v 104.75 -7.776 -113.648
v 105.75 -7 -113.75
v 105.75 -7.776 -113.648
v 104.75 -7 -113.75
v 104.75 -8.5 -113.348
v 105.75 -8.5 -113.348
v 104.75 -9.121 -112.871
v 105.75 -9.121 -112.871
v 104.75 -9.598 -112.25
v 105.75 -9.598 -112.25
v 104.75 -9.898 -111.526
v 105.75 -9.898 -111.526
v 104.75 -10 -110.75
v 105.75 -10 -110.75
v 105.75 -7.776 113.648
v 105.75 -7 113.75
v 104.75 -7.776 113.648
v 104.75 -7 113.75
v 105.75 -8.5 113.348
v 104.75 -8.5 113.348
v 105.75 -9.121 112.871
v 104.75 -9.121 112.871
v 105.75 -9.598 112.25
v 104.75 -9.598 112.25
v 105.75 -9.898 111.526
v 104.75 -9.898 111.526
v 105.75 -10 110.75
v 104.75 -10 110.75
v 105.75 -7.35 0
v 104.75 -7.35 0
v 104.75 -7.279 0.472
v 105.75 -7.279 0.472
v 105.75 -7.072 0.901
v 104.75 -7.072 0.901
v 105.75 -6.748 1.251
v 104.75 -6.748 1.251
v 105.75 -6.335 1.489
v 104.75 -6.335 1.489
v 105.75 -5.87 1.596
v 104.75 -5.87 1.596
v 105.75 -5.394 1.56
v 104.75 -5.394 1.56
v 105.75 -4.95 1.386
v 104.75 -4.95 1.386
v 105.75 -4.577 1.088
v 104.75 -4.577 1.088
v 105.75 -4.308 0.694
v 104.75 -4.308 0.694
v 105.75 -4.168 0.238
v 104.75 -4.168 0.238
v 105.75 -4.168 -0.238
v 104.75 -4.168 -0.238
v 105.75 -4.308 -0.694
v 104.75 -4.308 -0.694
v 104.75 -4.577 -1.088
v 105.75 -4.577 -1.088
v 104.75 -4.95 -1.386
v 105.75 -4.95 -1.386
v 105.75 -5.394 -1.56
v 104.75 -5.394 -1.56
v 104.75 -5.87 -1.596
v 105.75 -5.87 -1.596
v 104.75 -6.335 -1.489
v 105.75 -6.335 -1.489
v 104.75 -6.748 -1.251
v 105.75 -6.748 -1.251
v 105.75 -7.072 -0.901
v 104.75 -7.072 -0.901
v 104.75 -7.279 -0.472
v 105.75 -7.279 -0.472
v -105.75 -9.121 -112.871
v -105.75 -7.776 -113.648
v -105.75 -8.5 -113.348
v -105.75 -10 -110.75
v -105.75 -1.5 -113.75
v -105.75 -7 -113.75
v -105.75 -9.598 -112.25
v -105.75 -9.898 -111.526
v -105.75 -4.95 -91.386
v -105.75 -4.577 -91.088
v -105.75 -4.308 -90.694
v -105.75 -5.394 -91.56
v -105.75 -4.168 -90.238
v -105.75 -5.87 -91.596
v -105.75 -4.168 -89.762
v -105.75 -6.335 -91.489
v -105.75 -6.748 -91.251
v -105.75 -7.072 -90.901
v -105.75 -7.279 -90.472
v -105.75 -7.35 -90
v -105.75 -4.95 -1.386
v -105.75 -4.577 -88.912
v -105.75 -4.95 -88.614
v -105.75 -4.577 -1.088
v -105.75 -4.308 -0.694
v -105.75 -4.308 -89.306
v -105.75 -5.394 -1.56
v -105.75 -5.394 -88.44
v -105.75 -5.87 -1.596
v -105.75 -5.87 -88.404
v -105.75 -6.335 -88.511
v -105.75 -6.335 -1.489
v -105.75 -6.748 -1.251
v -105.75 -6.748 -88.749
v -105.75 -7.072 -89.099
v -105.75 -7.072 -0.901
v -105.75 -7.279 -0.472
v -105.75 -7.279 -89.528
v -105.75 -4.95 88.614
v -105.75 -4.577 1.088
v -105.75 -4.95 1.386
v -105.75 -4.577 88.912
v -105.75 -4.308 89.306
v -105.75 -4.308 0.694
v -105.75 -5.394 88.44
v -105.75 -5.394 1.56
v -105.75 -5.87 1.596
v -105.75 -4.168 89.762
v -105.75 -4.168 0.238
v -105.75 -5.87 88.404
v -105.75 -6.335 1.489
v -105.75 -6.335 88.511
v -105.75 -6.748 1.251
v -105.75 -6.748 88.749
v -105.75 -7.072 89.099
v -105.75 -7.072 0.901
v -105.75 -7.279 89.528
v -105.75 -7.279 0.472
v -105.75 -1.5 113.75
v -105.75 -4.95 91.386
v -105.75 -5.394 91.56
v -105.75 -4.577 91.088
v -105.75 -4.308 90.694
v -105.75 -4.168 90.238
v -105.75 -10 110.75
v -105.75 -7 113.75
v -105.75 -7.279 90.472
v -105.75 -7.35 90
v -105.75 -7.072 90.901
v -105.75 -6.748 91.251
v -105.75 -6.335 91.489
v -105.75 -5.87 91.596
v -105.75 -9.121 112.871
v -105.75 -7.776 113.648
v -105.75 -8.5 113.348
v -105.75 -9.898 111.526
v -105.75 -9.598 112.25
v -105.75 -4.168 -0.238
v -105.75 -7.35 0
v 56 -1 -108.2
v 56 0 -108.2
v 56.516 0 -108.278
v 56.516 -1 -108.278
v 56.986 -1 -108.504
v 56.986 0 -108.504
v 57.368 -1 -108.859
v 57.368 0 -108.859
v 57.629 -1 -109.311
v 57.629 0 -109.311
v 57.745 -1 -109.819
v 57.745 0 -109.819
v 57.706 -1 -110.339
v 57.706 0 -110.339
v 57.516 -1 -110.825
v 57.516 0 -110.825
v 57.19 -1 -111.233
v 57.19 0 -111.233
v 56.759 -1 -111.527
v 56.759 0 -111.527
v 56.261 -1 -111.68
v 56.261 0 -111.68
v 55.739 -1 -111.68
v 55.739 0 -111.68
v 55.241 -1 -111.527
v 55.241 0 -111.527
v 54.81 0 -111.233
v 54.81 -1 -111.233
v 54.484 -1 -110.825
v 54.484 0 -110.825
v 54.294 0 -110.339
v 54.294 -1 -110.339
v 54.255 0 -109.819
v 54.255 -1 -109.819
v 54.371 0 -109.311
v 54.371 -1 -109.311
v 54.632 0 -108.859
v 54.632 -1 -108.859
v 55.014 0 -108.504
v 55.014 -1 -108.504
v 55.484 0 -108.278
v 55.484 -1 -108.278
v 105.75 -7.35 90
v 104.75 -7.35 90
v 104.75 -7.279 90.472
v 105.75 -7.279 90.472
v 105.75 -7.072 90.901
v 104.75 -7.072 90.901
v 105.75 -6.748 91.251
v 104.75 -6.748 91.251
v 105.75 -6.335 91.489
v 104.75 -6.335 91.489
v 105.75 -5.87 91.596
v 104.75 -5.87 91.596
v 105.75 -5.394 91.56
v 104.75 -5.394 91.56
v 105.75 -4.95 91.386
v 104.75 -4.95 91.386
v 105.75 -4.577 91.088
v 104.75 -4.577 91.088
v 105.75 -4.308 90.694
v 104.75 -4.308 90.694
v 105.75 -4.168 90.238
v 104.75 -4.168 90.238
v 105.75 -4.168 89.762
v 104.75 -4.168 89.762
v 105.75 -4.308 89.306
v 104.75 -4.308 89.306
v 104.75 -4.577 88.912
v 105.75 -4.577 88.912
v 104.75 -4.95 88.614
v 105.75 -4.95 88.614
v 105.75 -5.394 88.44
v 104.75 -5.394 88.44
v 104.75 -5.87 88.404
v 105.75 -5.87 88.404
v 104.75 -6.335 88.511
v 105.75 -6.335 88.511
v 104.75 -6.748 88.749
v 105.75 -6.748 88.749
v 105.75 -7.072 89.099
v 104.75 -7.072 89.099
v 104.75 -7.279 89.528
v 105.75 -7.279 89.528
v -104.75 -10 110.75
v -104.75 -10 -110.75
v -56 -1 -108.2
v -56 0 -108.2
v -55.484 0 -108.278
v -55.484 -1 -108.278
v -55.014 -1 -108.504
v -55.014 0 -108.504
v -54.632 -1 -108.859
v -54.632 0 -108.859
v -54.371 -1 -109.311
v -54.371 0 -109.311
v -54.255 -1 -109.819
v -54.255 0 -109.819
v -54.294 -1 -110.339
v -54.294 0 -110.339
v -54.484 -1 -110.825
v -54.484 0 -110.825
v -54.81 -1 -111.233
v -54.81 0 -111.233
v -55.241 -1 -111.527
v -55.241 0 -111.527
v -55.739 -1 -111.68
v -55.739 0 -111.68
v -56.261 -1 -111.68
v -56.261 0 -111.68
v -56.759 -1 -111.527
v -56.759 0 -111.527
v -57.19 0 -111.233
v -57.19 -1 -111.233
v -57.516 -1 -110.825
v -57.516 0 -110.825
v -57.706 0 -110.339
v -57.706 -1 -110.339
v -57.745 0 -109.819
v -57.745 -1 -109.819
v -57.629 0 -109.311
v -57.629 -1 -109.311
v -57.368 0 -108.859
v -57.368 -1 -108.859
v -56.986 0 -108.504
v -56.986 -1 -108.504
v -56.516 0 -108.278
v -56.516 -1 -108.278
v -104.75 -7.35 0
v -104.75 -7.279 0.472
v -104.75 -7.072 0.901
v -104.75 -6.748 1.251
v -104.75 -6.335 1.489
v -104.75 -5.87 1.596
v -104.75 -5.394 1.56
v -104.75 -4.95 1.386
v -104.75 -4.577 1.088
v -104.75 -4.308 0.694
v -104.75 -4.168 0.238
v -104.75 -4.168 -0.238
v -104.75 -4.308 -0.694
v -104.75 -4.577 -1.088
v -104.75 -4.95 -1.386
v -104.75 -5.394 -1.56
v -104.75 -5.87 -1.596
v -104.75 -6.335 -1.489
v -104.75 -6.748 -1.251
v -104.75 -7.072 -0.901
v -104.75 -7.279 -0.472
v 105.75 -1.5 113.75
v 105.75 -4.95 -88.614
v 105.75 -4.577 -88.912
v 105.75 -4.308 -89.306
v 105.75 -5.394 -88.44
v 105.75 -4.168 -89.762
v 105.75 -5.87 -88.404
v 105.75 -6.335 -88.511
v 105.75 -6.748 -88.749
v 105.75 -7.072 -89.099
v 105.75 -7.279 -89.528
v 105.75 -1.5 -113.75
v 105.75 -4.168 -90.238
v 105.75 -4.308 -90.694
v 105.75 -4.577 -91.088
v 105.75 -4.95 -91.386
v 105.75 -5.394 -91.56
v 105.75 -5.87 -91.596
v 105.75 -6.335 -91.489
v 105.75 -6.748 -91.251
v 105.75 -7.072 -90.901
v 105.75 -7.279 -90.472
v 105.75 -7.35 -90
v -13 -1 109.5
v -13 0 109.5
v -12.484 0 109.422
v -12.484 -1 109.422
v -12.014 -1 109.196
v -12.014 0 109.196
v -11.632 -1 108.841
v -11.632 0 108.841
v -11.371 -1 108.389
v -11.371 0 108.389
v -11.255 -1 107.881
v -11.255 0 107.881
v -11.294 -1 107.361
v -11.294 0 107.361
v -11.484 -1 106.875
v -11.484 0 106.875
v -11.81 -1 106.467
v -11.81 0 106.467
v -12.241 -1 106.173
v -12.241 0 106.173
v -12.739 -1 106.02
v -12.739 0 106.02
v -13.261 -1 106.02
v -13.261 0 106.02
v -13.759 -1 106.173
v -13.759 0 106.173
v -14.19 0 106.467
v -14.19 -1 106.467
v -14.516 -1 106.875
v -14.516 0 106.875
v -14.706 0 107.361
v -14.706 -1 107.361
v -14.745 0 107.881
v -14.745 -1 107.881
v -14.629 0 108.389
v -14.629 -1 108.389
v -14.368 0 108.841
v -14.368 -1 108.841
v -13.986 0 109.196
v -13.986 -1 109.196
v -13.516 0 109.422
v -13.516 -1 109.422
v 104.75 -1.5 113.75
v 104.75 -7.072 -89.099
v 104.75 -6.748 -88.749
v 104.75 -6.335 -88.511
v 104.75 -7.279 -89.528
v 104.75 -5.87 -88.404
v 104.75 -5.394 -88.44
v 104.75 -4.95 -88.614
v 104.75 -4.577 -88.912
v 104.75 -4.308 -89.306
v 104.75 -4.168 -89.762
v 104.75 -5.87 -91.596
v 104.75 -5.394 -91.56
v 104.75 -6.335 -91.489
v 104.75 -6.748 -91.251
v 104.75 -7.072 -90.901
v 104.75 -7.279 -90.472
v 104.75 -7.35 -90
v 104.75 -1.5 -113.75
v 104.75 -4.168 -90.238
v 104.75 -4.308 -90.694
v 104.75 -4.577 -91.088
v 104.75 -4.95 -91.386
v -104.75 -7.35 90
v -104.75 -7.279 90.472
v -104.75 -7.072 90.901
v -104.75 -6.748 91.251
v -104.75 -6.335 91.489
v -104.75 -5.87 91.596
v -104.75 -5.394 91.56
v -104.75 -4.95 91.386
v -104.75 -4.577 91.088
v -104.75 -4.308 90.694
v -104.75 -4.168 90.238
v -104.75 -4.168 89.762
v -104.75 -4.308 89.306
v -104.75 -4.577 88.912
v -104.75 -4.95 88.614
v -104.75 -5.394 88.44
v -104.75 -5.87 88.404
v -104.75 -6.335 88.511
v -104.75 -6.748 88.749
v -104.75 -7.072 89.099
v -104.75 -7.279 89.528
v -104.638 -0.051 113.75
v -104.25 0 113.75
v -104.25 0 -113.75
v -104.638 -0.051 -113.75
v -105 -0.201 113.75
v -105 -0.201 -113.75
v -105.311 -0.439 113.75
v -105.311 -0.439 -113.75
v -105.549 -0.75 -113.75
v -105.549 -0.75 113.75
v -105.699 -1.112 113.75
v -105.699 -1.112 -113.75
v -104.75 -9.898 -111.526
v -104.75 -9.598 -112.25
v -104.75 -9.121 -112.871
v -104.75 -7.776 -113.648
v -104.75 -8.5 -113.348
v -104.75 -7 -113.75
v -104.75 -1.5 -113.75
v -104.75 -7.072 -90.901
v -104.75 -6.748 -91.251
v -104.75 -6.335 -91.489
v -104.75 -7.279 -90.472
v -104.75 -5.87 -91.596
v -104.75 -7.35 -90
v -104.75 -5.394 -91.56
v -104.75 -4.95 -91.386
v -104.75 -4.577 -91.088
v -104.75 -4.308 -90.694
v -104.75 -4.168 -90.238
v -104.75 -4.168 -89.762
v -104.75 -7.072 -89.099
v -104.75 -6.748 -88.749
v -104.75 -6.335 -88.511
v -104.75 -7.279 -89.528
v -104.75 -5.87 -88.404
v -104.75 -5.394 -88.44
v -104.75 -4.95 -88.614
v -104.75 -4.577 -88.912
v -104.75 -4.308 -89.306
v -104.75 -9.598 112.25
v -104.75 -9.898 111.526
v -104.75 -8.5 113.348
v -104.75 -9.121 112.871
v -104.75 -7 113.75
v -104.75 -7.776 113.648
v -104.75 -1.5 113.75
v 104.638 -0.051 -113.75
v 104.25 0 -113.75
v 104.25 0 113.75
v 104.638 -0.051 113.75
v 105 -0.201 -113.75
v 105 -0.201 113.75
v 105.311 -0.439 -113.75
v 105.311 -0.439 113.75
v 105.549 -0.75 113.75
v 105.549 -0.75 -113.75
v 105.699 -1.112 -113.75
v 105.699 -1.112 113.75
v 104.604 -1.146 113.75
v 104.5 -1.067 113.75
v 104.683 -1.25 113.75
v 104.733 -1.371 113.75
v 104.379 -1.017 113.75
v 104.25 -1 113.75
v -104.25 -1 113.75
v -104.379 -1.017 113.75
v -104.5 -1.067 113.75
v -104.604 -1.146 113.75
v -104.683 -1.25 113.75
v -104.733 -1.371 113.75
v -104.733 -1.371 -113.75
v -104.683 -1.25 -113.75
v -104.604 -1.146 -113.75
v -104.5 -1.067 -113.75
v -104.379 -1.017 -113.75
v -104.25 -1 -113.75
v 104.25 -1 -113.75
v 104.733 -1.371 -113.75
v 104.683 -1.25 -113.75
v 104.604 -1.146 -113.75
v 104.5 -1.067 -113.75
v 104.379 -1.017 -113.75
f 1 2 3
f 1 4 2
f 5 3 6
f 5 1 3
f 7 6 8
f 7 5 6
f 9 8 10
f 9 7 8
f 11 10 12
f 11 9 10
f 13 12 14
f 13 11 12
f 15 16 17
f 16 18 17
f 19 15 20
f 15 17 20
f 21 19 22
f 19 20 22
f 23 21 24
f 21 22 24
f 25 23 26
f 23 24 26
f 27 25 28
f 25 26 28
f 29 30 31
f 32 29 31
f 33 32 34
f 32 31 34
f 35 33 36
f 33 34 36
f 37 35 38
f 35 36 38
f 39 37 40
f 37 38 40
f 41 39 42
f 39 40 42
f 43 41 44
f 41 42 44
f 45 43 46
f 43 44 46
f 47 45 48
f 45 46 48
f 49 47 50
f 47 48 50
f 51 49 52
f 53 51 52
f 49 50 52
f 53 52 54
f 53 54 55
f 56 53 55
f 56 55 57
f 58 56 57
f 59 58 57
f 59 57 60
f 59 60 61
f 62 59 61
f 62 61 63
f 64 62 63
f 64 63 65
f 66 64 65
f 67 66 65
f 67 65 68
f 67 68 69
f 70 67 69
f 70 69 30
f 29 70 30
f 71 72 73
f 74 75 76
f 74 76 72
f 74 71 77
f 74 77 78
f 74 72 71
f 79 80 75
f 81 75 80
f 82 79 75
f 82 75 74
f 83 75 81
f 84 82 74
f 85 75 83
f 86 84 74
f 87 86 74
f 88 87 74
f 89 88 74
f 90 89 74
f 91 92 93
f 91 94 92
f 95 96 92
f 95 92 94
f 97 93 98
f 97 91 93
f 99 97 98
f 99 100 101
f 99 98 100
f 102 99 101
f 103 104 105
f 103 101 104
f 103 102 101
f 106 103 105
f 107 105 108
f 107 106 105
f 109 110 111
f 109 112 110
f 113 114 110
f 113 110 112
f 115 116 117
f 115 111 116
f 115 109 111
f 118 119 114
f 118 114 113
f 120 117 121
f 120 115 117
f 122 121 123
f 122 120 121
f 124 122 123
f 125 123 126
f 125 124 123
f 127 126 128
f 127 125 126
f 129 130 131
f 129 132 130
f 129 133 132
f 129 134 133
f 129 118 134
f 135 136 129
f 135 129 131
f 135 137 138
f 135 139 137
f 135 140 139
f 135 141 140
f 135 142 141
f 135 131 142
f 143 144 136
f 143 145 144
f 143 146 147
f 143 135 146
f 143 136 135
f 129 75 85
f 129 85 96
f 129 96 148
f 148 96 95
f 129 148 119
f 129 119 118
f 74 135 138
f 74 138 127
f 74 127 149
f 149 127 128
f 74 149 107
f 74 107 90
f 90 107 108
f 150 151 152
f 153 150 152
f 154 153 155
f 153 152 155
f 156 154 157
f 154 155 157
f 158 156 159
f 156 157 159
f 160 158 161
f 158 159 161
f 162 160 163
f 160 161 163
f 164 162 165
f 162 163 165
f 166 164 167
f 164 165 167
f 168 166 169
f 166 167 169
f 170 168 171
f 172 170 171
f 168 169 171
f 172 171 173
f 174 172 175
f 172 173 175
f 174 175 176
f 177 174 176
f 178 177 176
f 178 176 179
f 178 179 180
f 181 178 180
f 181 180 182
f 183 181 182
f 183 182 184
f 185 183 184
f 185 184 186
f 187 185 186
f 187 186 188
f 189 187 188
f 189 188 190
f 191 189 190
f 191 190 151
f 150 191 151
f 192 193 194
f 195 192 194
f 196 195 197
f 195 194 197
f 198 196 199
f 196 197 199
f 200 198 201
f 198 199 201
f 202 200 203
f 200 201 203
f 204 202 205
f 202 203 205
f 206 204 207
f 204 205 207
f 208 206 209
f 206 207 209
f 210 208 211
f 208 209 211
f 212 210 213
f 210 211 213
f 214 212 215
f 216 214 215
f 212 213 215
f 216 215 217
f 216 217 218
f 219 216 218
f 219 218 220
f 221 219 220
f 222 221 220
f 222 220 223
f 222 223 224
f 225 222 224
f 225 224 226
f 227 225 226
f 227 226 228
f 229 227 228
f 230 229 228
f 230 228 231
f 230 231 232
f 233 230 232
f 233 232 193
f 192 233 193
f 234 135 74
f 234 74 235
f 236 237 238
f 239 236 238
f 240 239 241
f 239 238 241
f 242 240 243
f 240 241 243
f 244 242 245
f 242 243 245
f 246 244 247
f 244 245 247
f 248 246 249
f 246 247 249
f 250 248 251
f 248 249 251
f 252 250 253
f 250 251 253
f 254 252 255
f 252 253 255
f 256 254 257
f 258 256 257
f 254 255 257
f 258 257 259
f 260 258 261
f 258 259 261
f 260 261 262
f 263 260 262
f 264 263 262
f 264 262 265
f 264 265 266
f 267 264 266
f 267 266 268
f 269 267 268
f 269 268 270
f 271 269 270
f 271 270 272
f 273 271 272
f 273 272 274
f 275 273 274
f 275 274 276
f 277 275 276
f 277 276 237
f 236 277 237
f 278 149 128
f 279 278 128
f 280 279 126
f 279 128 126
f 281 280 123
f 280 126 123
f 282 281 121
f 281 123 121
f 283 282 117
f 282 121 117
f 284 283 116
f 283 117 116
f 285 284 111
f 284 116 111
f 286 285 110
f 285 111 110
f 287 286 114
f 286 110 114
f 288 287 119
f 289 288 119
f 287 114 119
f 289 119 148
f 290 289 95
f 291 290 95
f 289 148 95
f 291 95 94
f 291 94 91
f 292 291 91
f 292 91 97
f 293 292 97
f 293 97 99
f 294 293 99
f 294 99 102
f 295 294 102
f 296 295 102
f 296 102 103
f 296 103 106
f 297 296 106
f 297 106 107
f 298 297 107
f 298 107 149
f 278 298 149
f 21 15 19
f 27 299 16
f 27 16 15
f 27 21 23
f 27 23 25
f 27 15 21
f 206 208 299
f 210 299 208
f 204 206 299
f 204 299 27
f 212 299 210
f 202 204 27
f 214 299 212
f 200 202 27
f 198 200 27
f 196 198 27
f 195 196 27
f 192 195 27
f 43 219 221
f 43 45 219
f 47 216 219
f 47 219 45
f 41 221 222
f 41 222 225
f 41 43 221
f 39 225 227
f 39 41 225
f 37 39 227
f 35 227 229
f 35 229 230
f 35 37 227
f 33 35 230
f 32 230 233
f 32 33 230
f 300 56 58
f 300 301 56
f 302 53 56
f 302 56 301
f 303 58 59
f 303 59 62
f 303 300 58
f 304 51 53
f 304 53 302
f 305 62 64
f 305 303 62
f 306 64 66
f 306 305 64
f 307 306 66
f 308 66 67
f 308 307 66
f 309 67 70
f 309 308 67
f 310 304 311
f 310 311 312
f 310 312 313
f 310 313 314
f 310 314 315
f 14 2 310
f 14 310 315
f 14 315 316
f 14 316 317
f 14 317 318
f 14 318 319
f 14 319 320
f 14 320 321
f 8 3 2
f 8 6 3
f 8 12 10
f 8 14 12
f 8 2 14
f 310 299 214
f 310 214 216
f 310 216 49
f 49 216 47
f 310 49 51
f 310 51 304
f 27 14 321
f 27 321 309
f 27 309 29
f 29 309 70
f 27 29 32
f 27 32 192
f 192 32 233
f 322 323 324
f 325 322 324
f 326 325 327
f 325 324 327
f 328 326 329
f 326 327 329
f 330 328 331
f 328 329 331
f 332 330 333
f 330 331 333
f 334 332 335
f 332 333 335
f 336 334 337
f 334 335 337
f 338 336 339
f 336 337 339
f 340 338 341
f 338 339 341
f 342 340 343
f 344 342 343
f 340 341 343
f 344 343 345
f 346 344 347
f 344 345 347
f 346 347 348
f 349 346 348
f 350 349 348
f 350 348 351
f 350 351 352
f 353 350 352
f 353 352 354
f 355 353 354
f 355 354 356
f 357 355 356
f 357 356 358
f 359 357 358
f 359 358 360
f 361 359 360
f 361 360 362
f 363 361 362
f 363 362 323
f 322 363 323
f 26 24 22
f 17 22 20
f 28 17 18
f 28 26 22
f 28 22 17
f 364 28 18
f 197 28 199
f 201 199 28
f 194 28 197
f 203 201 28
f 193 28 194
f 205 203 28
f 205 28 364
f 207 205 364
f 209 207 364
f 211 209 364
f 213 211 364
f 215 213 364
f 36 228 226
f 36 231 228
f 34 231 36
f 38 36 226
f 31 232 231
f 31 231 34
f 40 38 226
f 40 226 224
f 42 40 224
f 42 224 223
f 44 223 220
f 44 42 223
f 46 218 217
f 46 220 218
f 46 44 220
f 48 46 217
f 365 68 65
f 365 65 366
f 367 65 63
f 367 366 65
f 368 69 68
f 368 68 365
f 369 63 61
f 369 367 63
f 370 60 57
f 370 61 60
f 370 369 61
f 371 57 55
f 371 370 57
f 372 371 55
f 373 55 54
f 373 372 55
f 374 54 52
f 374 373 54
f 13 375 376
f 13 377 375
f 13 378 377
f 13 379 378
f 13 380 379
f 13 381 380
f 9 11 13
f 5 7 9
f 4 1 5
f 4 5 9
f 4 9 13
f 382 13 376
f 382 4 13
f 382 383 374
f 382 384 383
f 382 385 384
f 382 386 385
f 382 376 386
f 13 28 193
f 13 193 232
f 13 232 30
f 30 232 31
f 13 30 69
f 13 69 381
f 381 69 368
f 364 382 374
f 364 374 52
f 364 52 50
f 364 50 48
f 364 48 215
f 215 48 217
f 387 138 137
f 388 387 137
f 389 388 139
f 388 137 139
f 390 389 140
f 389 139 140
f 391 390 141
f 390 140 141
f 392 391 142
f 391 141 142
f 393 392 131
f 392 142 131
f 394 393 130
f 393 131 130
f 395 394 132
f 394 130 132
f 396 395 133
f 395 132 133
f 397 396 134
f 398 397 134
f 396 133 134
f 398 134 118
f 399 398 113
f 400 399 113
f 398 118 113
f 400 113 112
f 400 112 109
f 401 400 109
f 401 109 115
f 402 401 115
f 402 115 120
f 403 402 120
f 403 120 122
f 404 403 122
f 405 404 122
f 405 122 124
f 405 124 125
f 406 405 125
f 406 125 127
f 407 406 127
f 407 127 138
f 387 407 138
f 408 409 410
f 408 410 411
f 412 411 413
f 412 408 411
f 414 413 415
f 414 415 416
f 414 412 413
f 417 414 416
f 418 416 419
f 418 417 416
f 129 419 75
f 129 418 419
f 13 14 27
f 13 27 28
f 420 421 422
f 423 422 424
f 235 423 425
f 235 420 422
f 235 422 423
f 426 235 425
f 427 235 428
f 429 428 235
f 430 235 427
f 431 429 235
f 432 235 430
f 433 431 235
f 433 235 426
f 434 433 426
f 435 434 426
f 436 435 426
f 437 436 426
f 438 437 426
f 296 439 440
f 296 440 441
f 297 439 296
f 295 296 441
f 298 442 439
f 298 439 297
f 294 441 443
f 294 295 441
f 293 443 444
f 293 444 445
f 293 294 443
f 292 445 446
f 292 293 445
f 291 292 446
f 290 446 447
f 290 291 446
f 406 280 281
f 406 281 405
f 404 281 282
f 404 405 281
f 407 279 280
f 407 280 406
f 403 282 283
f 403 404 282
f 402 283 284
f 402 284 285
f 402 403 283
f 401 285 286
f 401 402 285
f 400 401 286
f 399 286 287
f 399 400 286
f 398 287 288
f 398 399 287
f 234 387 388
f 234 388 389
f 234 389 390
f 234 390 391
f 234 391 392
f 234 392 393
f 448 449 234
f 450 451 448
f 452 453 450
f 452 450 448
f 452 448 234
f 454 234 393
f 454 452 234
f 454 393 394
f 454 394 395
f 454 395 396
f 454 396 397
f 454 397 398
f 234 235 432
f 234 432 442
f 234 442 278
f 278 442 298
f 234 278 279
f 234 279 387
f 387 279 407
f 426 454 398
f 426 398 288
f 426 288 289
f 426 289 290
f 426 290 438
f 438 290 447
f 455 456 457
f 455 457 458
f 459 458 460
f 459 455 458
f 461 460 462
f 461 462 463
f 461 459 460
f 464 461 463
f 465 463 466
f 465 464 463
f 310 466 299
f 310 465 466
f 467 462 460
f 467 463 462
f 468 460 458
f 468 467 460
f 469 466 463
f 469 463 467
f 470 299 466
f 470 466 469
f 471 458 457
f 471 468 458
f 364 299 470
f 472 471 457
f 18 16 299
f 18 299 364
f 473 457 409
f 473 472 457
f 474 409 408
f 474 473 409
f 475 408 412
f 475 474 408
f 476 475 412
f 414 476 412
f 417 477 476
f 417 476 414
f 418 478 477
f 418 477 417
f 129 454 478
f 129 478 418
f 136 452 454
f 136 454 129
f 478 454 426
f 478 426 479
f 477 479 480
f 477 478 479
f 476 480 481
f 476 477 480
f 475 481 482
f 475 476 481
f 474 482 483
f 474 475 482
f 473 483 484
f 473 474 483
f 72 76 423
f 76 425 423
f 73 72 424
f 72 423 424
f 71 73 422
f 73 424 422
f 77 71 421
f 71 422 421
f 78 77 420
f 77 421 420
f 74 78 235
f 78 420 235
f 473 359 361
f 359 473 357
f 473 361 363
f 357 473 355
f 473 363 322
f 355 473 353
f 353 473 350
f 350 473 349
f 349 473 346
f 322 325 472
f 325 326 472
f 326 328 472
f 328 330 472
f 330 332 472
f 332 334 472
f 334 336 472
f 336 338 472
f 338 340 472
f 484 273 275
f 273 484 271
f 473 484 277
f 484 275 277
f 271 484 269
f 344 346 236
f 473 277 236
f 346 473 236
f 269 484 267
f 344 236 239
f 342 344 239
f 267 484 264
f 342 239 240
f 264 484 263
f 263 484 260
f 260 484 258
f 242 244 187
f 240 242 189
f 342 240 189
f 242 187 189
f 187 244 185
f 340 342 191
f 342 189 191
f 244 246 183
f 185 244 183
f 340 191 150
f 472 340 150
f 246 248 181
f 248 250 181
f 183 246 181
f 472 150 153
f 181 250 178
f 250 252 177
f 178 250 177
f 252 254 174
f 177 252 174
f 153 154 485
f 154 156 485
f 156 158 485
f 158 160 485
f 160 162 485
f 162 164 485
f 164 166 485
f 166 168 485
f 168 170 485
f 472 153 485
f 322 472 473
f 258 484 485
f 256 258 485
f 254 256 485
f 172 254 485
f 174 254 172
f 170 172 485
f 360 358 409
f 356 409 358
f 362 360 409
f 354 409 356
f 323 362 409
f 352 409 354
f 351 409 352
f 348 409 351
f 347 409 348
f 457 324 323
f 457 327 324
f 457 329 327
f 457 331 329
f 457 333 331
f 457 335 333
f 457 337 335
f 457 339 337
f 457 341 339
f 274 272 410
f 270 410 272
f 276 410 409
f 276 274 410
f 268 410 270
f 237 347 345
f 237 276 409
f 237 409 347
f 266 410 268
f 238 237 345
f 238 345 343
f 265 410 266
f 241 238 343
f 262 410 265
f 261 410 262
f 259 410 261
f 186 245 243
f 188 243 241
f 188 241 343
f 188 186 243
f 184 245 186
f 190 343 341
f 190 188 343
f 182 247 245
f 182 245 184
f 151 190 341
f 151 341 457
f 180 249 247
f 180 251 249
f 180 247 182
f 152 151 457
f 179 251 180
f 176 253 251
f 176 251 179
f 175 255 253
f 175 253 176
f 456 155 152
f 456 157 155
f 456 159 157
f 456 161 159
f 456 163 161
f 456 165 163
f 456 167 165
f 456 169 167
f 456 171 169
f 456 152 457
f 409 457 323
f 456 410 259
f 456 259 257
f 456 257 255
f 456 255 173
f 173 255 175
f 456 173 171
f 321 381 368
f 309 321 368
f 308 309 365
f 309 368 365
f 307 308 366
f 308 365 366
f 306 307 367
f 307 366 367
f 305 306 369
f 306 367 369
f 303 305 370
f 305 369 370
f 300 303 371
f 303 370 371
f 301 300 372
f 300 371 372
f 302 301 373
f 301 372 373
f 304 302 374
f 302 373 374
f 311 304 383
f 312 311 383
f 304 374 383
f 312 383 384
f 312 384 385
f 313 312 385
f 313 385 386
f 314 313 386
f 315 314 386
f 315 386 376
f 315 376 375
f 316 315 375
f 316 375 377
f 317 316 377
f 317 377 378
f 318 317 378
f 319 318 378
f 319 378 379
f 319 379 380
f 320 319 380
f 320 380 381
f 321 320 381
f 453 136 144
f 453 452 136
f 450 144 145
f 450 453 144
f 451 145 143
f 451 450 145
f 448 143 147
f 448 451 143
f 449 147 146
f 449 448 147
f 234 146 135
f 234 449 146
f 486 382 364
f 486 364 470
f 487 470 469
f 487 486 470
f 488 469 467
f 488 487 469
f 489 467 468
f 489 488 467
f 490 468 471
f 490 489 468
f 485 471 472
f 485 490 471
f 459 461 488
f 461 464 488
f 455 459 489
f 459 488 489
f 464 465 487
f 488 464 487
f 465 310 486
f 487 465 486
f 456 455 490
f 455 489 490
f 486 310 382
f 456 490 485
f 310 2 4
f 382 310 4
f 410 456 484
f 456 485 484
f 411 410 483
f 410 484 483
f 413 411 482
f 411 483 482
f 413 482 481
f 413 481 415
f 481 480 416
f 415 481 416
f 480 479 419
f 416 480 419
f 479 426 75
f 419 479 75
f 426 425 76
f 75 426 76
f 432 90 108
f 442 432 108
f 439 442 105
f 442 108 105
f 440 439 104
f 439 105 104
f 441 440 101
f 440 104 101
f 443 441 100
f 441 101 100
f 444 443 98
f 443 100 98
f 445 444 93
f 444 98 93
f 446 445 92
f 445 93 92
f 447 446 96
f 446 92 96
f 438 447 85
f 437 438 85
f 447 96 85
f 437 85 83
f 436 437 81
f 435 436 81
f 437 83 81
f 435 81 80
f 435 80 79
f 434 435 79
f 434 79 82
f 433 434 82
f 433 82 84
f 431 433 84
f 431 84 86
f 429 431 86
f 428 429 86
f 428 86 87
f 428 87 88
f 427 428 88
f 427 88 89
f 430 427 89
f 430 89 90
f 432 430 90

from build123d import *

# Parameters (mm, degrees)
SKETCH1_W                    = 211.5
SKETCH1_H                    = 227.5
BASE_FLANGE1_DEPTH           = 1
EDGE_FLANGE1_STRIP_W         = 5
EDGE_FLANGE1_STRIP_H         = 1
EDGE_FLANGE1_STRIP_CUT_DEPTH = 227.5
EDGE_FLANGE1_DEPTH           = 227.5
EDGE_FLANGE2_STRIP_W         = 5
EDGE_FLANGE2_STRIP_H         = 1
EDGE_FLANGE2_STRIP_CUT_DEPTH = 227.5
EDGE_FLANGE2_DEPTH           = 227.5
SKETCH13_R                   = 1.6
CUT_EXTRUDE1_DEPTH           = 241.356636064
FILLET1_R                    = 3
SKETCH14_R                   = 1.75
CUT_EXTRUDE2_DEPTH           = 156.634588058
SKETCH15_R                   = 1.75
CUT_EXTRUDE3_DEPTH           = 156.634588058


# Sheet-metal steps are written as plain solids
with BuildPart() as part:
    # Sketch1 → Base-Flange1 (new body)
    with BuildSketch(Plane(origin=(0, 0, 0), x_dir=(1, 0, 0), z_dir=(0, 1, 0))):
        Rectangle(SKETCH1_W, SKETCH1_H)
    extrude(amount=-BASE_FLANGE1_DEPTH)

    # Edge-Flange1 strip (across the edge) → Edge-Flange1 strip cut (cut)
    with BuildSketch(Plane(origin=(105.75, -1, -113.75), x_dir=(-1, 0, 0), z_dir=(0, 0, 1))):
        with Locations((-1, -0.5)):
            Rectangle(EDGE_FLANGE1_STRIP_W, EDGE_FLANGE1_STRIP_H)
    extrude(amount=EDGE_FLANGE1_STRIP_CUT_DEPTH, mode=Mode.SUBTRACT)

    # Edge-Flange1 section (across the edge) → Edge-Flange1 (add)
    with BuildSketch(Plane(origin=(105.75, -1, -113.75), x_dir=(-1, 0, 0), z_dir=(0, 0, 1))):
        with BuildLine():
            Line((0, 0.5), (0, 9))
            Line((0, 9), (1, 9))
            Line((1, 9), (1, 0.5))
            ThreePointArc((1, 0.5), (1.146446609, 0.146446609), (1.5, 0))
            Line((1.5, 0), (1.5, -1))
            ThreePointArc((1.5, -1), (0.439339828, -0.560660172), (0, 0.5))
        make_face()
    extrude(amount=EDGE_FLANGE1_DEPTH)

    # Edge-Flange2 strip (across the edge) → Edge-Flange2 strip cut (cut)
    with BuildSketch(Plane(origin=(-105.75, -1, 113.75), x_dir=(1, 0, 0), z_dir=(0, 0, -1))):
        with Locations((-1, -0.5)):
            Rectangle(EDGE_FLANGE2_STRIP_W, EDGE_FLANGE2_STRIP_H)
    extrude(amount=EDGE_FLANGE2_STRIP_CUT_DEPTH, mode=Mode.SUBTRACT)

    # Edge-Flange2 section (across the edge) → Edge-Flange2 (add)
    with BuildSketch(Plane(origin=(-105.75, -1, 113.75), x_dir=(1, 0, 0), z_dir=(0, 0, -1))):
        with BuildLine():
            Line((0, 0.5), (0, 9))
            Line((0, 9), (1, 9))
            Line((1, 9), (1, 0.5))
            ThreePointArc((1, 0.5), (1.146446609, 0.146446609), (1.5, 0))
            Line((1.5, 0), (1.5, -1))
            ThreePointArc((1.5, -1), (0.439339828, -0.560660172), (0, 0.5))
        make_face()
    extrude(amount=EDGE_FLANGE2_DEPTH)

    # Sketch13 → Cut-Extrude1 (cut, through all)
    with BuildSketch(Plane.ZY.offset(105.75)):
        with Locations(Location((0, -5.75, 0), (0, 0, 270))):
            Circle(SKETCH13_R)
        with Locations(Location((90, -5.75, 0), (0, 0, 270))):
            Circle(SKETCH13_R)
        with Locations(Location((-90, -5.75, 0), (0, 0, 270))):
            Circle(SKETCH13_R)
    extrude(amount=-CUT_EXTRUDE1_DEPTH, mode=Mode.SUBTRACT)

    # Fillet1
    fillet1_edges = [part.edges().sort_by_distance(p)[0] for p in [
        (105.25, -10, -113.75),
        (105.25, -10, 113.75),
        (-105.25, -10, 113.75),
        (-105.25, -10, -113.75),
    ]]
    fillet(fillet1_edges, radius=FILLET1_R)

    # Sketch14 → Cut-Extrude2 (cut, through all)
    with BuildSketch(Plane(origin=(0, 0, 0), x_dir=(1, 0, 0), z_dir=(0, 1, 0))):
        with Locations(Location((-56, 109.95, 0), (0, 0, 270))):
            Circle(SKETCH14_R)
        with Locations(Location((56, 109.95, 0), (0, 0, 270))):
            Circle(SKETCH14_R)
    extrude(amount=-CUT_EXTRUDE2_DEPTH, mode=Mode.SUBTRACT)

    # Sketch15 → Cut-Extrude3 (cut, through all)
    with BuildSketch(Plane(origin=(0, 0, 0), x_dir=(1, 0, 0), z_dir=(0, 1, 0))):
        with Locations(Location((-13, -107.75, 0), (0, 0, 270))):
            Circle(SKETCH15_R)
    extrude(amount=-CUT_EXTRUDE3_DEPTH, mode=Mode.SUBTRACT)


solid = part.part
